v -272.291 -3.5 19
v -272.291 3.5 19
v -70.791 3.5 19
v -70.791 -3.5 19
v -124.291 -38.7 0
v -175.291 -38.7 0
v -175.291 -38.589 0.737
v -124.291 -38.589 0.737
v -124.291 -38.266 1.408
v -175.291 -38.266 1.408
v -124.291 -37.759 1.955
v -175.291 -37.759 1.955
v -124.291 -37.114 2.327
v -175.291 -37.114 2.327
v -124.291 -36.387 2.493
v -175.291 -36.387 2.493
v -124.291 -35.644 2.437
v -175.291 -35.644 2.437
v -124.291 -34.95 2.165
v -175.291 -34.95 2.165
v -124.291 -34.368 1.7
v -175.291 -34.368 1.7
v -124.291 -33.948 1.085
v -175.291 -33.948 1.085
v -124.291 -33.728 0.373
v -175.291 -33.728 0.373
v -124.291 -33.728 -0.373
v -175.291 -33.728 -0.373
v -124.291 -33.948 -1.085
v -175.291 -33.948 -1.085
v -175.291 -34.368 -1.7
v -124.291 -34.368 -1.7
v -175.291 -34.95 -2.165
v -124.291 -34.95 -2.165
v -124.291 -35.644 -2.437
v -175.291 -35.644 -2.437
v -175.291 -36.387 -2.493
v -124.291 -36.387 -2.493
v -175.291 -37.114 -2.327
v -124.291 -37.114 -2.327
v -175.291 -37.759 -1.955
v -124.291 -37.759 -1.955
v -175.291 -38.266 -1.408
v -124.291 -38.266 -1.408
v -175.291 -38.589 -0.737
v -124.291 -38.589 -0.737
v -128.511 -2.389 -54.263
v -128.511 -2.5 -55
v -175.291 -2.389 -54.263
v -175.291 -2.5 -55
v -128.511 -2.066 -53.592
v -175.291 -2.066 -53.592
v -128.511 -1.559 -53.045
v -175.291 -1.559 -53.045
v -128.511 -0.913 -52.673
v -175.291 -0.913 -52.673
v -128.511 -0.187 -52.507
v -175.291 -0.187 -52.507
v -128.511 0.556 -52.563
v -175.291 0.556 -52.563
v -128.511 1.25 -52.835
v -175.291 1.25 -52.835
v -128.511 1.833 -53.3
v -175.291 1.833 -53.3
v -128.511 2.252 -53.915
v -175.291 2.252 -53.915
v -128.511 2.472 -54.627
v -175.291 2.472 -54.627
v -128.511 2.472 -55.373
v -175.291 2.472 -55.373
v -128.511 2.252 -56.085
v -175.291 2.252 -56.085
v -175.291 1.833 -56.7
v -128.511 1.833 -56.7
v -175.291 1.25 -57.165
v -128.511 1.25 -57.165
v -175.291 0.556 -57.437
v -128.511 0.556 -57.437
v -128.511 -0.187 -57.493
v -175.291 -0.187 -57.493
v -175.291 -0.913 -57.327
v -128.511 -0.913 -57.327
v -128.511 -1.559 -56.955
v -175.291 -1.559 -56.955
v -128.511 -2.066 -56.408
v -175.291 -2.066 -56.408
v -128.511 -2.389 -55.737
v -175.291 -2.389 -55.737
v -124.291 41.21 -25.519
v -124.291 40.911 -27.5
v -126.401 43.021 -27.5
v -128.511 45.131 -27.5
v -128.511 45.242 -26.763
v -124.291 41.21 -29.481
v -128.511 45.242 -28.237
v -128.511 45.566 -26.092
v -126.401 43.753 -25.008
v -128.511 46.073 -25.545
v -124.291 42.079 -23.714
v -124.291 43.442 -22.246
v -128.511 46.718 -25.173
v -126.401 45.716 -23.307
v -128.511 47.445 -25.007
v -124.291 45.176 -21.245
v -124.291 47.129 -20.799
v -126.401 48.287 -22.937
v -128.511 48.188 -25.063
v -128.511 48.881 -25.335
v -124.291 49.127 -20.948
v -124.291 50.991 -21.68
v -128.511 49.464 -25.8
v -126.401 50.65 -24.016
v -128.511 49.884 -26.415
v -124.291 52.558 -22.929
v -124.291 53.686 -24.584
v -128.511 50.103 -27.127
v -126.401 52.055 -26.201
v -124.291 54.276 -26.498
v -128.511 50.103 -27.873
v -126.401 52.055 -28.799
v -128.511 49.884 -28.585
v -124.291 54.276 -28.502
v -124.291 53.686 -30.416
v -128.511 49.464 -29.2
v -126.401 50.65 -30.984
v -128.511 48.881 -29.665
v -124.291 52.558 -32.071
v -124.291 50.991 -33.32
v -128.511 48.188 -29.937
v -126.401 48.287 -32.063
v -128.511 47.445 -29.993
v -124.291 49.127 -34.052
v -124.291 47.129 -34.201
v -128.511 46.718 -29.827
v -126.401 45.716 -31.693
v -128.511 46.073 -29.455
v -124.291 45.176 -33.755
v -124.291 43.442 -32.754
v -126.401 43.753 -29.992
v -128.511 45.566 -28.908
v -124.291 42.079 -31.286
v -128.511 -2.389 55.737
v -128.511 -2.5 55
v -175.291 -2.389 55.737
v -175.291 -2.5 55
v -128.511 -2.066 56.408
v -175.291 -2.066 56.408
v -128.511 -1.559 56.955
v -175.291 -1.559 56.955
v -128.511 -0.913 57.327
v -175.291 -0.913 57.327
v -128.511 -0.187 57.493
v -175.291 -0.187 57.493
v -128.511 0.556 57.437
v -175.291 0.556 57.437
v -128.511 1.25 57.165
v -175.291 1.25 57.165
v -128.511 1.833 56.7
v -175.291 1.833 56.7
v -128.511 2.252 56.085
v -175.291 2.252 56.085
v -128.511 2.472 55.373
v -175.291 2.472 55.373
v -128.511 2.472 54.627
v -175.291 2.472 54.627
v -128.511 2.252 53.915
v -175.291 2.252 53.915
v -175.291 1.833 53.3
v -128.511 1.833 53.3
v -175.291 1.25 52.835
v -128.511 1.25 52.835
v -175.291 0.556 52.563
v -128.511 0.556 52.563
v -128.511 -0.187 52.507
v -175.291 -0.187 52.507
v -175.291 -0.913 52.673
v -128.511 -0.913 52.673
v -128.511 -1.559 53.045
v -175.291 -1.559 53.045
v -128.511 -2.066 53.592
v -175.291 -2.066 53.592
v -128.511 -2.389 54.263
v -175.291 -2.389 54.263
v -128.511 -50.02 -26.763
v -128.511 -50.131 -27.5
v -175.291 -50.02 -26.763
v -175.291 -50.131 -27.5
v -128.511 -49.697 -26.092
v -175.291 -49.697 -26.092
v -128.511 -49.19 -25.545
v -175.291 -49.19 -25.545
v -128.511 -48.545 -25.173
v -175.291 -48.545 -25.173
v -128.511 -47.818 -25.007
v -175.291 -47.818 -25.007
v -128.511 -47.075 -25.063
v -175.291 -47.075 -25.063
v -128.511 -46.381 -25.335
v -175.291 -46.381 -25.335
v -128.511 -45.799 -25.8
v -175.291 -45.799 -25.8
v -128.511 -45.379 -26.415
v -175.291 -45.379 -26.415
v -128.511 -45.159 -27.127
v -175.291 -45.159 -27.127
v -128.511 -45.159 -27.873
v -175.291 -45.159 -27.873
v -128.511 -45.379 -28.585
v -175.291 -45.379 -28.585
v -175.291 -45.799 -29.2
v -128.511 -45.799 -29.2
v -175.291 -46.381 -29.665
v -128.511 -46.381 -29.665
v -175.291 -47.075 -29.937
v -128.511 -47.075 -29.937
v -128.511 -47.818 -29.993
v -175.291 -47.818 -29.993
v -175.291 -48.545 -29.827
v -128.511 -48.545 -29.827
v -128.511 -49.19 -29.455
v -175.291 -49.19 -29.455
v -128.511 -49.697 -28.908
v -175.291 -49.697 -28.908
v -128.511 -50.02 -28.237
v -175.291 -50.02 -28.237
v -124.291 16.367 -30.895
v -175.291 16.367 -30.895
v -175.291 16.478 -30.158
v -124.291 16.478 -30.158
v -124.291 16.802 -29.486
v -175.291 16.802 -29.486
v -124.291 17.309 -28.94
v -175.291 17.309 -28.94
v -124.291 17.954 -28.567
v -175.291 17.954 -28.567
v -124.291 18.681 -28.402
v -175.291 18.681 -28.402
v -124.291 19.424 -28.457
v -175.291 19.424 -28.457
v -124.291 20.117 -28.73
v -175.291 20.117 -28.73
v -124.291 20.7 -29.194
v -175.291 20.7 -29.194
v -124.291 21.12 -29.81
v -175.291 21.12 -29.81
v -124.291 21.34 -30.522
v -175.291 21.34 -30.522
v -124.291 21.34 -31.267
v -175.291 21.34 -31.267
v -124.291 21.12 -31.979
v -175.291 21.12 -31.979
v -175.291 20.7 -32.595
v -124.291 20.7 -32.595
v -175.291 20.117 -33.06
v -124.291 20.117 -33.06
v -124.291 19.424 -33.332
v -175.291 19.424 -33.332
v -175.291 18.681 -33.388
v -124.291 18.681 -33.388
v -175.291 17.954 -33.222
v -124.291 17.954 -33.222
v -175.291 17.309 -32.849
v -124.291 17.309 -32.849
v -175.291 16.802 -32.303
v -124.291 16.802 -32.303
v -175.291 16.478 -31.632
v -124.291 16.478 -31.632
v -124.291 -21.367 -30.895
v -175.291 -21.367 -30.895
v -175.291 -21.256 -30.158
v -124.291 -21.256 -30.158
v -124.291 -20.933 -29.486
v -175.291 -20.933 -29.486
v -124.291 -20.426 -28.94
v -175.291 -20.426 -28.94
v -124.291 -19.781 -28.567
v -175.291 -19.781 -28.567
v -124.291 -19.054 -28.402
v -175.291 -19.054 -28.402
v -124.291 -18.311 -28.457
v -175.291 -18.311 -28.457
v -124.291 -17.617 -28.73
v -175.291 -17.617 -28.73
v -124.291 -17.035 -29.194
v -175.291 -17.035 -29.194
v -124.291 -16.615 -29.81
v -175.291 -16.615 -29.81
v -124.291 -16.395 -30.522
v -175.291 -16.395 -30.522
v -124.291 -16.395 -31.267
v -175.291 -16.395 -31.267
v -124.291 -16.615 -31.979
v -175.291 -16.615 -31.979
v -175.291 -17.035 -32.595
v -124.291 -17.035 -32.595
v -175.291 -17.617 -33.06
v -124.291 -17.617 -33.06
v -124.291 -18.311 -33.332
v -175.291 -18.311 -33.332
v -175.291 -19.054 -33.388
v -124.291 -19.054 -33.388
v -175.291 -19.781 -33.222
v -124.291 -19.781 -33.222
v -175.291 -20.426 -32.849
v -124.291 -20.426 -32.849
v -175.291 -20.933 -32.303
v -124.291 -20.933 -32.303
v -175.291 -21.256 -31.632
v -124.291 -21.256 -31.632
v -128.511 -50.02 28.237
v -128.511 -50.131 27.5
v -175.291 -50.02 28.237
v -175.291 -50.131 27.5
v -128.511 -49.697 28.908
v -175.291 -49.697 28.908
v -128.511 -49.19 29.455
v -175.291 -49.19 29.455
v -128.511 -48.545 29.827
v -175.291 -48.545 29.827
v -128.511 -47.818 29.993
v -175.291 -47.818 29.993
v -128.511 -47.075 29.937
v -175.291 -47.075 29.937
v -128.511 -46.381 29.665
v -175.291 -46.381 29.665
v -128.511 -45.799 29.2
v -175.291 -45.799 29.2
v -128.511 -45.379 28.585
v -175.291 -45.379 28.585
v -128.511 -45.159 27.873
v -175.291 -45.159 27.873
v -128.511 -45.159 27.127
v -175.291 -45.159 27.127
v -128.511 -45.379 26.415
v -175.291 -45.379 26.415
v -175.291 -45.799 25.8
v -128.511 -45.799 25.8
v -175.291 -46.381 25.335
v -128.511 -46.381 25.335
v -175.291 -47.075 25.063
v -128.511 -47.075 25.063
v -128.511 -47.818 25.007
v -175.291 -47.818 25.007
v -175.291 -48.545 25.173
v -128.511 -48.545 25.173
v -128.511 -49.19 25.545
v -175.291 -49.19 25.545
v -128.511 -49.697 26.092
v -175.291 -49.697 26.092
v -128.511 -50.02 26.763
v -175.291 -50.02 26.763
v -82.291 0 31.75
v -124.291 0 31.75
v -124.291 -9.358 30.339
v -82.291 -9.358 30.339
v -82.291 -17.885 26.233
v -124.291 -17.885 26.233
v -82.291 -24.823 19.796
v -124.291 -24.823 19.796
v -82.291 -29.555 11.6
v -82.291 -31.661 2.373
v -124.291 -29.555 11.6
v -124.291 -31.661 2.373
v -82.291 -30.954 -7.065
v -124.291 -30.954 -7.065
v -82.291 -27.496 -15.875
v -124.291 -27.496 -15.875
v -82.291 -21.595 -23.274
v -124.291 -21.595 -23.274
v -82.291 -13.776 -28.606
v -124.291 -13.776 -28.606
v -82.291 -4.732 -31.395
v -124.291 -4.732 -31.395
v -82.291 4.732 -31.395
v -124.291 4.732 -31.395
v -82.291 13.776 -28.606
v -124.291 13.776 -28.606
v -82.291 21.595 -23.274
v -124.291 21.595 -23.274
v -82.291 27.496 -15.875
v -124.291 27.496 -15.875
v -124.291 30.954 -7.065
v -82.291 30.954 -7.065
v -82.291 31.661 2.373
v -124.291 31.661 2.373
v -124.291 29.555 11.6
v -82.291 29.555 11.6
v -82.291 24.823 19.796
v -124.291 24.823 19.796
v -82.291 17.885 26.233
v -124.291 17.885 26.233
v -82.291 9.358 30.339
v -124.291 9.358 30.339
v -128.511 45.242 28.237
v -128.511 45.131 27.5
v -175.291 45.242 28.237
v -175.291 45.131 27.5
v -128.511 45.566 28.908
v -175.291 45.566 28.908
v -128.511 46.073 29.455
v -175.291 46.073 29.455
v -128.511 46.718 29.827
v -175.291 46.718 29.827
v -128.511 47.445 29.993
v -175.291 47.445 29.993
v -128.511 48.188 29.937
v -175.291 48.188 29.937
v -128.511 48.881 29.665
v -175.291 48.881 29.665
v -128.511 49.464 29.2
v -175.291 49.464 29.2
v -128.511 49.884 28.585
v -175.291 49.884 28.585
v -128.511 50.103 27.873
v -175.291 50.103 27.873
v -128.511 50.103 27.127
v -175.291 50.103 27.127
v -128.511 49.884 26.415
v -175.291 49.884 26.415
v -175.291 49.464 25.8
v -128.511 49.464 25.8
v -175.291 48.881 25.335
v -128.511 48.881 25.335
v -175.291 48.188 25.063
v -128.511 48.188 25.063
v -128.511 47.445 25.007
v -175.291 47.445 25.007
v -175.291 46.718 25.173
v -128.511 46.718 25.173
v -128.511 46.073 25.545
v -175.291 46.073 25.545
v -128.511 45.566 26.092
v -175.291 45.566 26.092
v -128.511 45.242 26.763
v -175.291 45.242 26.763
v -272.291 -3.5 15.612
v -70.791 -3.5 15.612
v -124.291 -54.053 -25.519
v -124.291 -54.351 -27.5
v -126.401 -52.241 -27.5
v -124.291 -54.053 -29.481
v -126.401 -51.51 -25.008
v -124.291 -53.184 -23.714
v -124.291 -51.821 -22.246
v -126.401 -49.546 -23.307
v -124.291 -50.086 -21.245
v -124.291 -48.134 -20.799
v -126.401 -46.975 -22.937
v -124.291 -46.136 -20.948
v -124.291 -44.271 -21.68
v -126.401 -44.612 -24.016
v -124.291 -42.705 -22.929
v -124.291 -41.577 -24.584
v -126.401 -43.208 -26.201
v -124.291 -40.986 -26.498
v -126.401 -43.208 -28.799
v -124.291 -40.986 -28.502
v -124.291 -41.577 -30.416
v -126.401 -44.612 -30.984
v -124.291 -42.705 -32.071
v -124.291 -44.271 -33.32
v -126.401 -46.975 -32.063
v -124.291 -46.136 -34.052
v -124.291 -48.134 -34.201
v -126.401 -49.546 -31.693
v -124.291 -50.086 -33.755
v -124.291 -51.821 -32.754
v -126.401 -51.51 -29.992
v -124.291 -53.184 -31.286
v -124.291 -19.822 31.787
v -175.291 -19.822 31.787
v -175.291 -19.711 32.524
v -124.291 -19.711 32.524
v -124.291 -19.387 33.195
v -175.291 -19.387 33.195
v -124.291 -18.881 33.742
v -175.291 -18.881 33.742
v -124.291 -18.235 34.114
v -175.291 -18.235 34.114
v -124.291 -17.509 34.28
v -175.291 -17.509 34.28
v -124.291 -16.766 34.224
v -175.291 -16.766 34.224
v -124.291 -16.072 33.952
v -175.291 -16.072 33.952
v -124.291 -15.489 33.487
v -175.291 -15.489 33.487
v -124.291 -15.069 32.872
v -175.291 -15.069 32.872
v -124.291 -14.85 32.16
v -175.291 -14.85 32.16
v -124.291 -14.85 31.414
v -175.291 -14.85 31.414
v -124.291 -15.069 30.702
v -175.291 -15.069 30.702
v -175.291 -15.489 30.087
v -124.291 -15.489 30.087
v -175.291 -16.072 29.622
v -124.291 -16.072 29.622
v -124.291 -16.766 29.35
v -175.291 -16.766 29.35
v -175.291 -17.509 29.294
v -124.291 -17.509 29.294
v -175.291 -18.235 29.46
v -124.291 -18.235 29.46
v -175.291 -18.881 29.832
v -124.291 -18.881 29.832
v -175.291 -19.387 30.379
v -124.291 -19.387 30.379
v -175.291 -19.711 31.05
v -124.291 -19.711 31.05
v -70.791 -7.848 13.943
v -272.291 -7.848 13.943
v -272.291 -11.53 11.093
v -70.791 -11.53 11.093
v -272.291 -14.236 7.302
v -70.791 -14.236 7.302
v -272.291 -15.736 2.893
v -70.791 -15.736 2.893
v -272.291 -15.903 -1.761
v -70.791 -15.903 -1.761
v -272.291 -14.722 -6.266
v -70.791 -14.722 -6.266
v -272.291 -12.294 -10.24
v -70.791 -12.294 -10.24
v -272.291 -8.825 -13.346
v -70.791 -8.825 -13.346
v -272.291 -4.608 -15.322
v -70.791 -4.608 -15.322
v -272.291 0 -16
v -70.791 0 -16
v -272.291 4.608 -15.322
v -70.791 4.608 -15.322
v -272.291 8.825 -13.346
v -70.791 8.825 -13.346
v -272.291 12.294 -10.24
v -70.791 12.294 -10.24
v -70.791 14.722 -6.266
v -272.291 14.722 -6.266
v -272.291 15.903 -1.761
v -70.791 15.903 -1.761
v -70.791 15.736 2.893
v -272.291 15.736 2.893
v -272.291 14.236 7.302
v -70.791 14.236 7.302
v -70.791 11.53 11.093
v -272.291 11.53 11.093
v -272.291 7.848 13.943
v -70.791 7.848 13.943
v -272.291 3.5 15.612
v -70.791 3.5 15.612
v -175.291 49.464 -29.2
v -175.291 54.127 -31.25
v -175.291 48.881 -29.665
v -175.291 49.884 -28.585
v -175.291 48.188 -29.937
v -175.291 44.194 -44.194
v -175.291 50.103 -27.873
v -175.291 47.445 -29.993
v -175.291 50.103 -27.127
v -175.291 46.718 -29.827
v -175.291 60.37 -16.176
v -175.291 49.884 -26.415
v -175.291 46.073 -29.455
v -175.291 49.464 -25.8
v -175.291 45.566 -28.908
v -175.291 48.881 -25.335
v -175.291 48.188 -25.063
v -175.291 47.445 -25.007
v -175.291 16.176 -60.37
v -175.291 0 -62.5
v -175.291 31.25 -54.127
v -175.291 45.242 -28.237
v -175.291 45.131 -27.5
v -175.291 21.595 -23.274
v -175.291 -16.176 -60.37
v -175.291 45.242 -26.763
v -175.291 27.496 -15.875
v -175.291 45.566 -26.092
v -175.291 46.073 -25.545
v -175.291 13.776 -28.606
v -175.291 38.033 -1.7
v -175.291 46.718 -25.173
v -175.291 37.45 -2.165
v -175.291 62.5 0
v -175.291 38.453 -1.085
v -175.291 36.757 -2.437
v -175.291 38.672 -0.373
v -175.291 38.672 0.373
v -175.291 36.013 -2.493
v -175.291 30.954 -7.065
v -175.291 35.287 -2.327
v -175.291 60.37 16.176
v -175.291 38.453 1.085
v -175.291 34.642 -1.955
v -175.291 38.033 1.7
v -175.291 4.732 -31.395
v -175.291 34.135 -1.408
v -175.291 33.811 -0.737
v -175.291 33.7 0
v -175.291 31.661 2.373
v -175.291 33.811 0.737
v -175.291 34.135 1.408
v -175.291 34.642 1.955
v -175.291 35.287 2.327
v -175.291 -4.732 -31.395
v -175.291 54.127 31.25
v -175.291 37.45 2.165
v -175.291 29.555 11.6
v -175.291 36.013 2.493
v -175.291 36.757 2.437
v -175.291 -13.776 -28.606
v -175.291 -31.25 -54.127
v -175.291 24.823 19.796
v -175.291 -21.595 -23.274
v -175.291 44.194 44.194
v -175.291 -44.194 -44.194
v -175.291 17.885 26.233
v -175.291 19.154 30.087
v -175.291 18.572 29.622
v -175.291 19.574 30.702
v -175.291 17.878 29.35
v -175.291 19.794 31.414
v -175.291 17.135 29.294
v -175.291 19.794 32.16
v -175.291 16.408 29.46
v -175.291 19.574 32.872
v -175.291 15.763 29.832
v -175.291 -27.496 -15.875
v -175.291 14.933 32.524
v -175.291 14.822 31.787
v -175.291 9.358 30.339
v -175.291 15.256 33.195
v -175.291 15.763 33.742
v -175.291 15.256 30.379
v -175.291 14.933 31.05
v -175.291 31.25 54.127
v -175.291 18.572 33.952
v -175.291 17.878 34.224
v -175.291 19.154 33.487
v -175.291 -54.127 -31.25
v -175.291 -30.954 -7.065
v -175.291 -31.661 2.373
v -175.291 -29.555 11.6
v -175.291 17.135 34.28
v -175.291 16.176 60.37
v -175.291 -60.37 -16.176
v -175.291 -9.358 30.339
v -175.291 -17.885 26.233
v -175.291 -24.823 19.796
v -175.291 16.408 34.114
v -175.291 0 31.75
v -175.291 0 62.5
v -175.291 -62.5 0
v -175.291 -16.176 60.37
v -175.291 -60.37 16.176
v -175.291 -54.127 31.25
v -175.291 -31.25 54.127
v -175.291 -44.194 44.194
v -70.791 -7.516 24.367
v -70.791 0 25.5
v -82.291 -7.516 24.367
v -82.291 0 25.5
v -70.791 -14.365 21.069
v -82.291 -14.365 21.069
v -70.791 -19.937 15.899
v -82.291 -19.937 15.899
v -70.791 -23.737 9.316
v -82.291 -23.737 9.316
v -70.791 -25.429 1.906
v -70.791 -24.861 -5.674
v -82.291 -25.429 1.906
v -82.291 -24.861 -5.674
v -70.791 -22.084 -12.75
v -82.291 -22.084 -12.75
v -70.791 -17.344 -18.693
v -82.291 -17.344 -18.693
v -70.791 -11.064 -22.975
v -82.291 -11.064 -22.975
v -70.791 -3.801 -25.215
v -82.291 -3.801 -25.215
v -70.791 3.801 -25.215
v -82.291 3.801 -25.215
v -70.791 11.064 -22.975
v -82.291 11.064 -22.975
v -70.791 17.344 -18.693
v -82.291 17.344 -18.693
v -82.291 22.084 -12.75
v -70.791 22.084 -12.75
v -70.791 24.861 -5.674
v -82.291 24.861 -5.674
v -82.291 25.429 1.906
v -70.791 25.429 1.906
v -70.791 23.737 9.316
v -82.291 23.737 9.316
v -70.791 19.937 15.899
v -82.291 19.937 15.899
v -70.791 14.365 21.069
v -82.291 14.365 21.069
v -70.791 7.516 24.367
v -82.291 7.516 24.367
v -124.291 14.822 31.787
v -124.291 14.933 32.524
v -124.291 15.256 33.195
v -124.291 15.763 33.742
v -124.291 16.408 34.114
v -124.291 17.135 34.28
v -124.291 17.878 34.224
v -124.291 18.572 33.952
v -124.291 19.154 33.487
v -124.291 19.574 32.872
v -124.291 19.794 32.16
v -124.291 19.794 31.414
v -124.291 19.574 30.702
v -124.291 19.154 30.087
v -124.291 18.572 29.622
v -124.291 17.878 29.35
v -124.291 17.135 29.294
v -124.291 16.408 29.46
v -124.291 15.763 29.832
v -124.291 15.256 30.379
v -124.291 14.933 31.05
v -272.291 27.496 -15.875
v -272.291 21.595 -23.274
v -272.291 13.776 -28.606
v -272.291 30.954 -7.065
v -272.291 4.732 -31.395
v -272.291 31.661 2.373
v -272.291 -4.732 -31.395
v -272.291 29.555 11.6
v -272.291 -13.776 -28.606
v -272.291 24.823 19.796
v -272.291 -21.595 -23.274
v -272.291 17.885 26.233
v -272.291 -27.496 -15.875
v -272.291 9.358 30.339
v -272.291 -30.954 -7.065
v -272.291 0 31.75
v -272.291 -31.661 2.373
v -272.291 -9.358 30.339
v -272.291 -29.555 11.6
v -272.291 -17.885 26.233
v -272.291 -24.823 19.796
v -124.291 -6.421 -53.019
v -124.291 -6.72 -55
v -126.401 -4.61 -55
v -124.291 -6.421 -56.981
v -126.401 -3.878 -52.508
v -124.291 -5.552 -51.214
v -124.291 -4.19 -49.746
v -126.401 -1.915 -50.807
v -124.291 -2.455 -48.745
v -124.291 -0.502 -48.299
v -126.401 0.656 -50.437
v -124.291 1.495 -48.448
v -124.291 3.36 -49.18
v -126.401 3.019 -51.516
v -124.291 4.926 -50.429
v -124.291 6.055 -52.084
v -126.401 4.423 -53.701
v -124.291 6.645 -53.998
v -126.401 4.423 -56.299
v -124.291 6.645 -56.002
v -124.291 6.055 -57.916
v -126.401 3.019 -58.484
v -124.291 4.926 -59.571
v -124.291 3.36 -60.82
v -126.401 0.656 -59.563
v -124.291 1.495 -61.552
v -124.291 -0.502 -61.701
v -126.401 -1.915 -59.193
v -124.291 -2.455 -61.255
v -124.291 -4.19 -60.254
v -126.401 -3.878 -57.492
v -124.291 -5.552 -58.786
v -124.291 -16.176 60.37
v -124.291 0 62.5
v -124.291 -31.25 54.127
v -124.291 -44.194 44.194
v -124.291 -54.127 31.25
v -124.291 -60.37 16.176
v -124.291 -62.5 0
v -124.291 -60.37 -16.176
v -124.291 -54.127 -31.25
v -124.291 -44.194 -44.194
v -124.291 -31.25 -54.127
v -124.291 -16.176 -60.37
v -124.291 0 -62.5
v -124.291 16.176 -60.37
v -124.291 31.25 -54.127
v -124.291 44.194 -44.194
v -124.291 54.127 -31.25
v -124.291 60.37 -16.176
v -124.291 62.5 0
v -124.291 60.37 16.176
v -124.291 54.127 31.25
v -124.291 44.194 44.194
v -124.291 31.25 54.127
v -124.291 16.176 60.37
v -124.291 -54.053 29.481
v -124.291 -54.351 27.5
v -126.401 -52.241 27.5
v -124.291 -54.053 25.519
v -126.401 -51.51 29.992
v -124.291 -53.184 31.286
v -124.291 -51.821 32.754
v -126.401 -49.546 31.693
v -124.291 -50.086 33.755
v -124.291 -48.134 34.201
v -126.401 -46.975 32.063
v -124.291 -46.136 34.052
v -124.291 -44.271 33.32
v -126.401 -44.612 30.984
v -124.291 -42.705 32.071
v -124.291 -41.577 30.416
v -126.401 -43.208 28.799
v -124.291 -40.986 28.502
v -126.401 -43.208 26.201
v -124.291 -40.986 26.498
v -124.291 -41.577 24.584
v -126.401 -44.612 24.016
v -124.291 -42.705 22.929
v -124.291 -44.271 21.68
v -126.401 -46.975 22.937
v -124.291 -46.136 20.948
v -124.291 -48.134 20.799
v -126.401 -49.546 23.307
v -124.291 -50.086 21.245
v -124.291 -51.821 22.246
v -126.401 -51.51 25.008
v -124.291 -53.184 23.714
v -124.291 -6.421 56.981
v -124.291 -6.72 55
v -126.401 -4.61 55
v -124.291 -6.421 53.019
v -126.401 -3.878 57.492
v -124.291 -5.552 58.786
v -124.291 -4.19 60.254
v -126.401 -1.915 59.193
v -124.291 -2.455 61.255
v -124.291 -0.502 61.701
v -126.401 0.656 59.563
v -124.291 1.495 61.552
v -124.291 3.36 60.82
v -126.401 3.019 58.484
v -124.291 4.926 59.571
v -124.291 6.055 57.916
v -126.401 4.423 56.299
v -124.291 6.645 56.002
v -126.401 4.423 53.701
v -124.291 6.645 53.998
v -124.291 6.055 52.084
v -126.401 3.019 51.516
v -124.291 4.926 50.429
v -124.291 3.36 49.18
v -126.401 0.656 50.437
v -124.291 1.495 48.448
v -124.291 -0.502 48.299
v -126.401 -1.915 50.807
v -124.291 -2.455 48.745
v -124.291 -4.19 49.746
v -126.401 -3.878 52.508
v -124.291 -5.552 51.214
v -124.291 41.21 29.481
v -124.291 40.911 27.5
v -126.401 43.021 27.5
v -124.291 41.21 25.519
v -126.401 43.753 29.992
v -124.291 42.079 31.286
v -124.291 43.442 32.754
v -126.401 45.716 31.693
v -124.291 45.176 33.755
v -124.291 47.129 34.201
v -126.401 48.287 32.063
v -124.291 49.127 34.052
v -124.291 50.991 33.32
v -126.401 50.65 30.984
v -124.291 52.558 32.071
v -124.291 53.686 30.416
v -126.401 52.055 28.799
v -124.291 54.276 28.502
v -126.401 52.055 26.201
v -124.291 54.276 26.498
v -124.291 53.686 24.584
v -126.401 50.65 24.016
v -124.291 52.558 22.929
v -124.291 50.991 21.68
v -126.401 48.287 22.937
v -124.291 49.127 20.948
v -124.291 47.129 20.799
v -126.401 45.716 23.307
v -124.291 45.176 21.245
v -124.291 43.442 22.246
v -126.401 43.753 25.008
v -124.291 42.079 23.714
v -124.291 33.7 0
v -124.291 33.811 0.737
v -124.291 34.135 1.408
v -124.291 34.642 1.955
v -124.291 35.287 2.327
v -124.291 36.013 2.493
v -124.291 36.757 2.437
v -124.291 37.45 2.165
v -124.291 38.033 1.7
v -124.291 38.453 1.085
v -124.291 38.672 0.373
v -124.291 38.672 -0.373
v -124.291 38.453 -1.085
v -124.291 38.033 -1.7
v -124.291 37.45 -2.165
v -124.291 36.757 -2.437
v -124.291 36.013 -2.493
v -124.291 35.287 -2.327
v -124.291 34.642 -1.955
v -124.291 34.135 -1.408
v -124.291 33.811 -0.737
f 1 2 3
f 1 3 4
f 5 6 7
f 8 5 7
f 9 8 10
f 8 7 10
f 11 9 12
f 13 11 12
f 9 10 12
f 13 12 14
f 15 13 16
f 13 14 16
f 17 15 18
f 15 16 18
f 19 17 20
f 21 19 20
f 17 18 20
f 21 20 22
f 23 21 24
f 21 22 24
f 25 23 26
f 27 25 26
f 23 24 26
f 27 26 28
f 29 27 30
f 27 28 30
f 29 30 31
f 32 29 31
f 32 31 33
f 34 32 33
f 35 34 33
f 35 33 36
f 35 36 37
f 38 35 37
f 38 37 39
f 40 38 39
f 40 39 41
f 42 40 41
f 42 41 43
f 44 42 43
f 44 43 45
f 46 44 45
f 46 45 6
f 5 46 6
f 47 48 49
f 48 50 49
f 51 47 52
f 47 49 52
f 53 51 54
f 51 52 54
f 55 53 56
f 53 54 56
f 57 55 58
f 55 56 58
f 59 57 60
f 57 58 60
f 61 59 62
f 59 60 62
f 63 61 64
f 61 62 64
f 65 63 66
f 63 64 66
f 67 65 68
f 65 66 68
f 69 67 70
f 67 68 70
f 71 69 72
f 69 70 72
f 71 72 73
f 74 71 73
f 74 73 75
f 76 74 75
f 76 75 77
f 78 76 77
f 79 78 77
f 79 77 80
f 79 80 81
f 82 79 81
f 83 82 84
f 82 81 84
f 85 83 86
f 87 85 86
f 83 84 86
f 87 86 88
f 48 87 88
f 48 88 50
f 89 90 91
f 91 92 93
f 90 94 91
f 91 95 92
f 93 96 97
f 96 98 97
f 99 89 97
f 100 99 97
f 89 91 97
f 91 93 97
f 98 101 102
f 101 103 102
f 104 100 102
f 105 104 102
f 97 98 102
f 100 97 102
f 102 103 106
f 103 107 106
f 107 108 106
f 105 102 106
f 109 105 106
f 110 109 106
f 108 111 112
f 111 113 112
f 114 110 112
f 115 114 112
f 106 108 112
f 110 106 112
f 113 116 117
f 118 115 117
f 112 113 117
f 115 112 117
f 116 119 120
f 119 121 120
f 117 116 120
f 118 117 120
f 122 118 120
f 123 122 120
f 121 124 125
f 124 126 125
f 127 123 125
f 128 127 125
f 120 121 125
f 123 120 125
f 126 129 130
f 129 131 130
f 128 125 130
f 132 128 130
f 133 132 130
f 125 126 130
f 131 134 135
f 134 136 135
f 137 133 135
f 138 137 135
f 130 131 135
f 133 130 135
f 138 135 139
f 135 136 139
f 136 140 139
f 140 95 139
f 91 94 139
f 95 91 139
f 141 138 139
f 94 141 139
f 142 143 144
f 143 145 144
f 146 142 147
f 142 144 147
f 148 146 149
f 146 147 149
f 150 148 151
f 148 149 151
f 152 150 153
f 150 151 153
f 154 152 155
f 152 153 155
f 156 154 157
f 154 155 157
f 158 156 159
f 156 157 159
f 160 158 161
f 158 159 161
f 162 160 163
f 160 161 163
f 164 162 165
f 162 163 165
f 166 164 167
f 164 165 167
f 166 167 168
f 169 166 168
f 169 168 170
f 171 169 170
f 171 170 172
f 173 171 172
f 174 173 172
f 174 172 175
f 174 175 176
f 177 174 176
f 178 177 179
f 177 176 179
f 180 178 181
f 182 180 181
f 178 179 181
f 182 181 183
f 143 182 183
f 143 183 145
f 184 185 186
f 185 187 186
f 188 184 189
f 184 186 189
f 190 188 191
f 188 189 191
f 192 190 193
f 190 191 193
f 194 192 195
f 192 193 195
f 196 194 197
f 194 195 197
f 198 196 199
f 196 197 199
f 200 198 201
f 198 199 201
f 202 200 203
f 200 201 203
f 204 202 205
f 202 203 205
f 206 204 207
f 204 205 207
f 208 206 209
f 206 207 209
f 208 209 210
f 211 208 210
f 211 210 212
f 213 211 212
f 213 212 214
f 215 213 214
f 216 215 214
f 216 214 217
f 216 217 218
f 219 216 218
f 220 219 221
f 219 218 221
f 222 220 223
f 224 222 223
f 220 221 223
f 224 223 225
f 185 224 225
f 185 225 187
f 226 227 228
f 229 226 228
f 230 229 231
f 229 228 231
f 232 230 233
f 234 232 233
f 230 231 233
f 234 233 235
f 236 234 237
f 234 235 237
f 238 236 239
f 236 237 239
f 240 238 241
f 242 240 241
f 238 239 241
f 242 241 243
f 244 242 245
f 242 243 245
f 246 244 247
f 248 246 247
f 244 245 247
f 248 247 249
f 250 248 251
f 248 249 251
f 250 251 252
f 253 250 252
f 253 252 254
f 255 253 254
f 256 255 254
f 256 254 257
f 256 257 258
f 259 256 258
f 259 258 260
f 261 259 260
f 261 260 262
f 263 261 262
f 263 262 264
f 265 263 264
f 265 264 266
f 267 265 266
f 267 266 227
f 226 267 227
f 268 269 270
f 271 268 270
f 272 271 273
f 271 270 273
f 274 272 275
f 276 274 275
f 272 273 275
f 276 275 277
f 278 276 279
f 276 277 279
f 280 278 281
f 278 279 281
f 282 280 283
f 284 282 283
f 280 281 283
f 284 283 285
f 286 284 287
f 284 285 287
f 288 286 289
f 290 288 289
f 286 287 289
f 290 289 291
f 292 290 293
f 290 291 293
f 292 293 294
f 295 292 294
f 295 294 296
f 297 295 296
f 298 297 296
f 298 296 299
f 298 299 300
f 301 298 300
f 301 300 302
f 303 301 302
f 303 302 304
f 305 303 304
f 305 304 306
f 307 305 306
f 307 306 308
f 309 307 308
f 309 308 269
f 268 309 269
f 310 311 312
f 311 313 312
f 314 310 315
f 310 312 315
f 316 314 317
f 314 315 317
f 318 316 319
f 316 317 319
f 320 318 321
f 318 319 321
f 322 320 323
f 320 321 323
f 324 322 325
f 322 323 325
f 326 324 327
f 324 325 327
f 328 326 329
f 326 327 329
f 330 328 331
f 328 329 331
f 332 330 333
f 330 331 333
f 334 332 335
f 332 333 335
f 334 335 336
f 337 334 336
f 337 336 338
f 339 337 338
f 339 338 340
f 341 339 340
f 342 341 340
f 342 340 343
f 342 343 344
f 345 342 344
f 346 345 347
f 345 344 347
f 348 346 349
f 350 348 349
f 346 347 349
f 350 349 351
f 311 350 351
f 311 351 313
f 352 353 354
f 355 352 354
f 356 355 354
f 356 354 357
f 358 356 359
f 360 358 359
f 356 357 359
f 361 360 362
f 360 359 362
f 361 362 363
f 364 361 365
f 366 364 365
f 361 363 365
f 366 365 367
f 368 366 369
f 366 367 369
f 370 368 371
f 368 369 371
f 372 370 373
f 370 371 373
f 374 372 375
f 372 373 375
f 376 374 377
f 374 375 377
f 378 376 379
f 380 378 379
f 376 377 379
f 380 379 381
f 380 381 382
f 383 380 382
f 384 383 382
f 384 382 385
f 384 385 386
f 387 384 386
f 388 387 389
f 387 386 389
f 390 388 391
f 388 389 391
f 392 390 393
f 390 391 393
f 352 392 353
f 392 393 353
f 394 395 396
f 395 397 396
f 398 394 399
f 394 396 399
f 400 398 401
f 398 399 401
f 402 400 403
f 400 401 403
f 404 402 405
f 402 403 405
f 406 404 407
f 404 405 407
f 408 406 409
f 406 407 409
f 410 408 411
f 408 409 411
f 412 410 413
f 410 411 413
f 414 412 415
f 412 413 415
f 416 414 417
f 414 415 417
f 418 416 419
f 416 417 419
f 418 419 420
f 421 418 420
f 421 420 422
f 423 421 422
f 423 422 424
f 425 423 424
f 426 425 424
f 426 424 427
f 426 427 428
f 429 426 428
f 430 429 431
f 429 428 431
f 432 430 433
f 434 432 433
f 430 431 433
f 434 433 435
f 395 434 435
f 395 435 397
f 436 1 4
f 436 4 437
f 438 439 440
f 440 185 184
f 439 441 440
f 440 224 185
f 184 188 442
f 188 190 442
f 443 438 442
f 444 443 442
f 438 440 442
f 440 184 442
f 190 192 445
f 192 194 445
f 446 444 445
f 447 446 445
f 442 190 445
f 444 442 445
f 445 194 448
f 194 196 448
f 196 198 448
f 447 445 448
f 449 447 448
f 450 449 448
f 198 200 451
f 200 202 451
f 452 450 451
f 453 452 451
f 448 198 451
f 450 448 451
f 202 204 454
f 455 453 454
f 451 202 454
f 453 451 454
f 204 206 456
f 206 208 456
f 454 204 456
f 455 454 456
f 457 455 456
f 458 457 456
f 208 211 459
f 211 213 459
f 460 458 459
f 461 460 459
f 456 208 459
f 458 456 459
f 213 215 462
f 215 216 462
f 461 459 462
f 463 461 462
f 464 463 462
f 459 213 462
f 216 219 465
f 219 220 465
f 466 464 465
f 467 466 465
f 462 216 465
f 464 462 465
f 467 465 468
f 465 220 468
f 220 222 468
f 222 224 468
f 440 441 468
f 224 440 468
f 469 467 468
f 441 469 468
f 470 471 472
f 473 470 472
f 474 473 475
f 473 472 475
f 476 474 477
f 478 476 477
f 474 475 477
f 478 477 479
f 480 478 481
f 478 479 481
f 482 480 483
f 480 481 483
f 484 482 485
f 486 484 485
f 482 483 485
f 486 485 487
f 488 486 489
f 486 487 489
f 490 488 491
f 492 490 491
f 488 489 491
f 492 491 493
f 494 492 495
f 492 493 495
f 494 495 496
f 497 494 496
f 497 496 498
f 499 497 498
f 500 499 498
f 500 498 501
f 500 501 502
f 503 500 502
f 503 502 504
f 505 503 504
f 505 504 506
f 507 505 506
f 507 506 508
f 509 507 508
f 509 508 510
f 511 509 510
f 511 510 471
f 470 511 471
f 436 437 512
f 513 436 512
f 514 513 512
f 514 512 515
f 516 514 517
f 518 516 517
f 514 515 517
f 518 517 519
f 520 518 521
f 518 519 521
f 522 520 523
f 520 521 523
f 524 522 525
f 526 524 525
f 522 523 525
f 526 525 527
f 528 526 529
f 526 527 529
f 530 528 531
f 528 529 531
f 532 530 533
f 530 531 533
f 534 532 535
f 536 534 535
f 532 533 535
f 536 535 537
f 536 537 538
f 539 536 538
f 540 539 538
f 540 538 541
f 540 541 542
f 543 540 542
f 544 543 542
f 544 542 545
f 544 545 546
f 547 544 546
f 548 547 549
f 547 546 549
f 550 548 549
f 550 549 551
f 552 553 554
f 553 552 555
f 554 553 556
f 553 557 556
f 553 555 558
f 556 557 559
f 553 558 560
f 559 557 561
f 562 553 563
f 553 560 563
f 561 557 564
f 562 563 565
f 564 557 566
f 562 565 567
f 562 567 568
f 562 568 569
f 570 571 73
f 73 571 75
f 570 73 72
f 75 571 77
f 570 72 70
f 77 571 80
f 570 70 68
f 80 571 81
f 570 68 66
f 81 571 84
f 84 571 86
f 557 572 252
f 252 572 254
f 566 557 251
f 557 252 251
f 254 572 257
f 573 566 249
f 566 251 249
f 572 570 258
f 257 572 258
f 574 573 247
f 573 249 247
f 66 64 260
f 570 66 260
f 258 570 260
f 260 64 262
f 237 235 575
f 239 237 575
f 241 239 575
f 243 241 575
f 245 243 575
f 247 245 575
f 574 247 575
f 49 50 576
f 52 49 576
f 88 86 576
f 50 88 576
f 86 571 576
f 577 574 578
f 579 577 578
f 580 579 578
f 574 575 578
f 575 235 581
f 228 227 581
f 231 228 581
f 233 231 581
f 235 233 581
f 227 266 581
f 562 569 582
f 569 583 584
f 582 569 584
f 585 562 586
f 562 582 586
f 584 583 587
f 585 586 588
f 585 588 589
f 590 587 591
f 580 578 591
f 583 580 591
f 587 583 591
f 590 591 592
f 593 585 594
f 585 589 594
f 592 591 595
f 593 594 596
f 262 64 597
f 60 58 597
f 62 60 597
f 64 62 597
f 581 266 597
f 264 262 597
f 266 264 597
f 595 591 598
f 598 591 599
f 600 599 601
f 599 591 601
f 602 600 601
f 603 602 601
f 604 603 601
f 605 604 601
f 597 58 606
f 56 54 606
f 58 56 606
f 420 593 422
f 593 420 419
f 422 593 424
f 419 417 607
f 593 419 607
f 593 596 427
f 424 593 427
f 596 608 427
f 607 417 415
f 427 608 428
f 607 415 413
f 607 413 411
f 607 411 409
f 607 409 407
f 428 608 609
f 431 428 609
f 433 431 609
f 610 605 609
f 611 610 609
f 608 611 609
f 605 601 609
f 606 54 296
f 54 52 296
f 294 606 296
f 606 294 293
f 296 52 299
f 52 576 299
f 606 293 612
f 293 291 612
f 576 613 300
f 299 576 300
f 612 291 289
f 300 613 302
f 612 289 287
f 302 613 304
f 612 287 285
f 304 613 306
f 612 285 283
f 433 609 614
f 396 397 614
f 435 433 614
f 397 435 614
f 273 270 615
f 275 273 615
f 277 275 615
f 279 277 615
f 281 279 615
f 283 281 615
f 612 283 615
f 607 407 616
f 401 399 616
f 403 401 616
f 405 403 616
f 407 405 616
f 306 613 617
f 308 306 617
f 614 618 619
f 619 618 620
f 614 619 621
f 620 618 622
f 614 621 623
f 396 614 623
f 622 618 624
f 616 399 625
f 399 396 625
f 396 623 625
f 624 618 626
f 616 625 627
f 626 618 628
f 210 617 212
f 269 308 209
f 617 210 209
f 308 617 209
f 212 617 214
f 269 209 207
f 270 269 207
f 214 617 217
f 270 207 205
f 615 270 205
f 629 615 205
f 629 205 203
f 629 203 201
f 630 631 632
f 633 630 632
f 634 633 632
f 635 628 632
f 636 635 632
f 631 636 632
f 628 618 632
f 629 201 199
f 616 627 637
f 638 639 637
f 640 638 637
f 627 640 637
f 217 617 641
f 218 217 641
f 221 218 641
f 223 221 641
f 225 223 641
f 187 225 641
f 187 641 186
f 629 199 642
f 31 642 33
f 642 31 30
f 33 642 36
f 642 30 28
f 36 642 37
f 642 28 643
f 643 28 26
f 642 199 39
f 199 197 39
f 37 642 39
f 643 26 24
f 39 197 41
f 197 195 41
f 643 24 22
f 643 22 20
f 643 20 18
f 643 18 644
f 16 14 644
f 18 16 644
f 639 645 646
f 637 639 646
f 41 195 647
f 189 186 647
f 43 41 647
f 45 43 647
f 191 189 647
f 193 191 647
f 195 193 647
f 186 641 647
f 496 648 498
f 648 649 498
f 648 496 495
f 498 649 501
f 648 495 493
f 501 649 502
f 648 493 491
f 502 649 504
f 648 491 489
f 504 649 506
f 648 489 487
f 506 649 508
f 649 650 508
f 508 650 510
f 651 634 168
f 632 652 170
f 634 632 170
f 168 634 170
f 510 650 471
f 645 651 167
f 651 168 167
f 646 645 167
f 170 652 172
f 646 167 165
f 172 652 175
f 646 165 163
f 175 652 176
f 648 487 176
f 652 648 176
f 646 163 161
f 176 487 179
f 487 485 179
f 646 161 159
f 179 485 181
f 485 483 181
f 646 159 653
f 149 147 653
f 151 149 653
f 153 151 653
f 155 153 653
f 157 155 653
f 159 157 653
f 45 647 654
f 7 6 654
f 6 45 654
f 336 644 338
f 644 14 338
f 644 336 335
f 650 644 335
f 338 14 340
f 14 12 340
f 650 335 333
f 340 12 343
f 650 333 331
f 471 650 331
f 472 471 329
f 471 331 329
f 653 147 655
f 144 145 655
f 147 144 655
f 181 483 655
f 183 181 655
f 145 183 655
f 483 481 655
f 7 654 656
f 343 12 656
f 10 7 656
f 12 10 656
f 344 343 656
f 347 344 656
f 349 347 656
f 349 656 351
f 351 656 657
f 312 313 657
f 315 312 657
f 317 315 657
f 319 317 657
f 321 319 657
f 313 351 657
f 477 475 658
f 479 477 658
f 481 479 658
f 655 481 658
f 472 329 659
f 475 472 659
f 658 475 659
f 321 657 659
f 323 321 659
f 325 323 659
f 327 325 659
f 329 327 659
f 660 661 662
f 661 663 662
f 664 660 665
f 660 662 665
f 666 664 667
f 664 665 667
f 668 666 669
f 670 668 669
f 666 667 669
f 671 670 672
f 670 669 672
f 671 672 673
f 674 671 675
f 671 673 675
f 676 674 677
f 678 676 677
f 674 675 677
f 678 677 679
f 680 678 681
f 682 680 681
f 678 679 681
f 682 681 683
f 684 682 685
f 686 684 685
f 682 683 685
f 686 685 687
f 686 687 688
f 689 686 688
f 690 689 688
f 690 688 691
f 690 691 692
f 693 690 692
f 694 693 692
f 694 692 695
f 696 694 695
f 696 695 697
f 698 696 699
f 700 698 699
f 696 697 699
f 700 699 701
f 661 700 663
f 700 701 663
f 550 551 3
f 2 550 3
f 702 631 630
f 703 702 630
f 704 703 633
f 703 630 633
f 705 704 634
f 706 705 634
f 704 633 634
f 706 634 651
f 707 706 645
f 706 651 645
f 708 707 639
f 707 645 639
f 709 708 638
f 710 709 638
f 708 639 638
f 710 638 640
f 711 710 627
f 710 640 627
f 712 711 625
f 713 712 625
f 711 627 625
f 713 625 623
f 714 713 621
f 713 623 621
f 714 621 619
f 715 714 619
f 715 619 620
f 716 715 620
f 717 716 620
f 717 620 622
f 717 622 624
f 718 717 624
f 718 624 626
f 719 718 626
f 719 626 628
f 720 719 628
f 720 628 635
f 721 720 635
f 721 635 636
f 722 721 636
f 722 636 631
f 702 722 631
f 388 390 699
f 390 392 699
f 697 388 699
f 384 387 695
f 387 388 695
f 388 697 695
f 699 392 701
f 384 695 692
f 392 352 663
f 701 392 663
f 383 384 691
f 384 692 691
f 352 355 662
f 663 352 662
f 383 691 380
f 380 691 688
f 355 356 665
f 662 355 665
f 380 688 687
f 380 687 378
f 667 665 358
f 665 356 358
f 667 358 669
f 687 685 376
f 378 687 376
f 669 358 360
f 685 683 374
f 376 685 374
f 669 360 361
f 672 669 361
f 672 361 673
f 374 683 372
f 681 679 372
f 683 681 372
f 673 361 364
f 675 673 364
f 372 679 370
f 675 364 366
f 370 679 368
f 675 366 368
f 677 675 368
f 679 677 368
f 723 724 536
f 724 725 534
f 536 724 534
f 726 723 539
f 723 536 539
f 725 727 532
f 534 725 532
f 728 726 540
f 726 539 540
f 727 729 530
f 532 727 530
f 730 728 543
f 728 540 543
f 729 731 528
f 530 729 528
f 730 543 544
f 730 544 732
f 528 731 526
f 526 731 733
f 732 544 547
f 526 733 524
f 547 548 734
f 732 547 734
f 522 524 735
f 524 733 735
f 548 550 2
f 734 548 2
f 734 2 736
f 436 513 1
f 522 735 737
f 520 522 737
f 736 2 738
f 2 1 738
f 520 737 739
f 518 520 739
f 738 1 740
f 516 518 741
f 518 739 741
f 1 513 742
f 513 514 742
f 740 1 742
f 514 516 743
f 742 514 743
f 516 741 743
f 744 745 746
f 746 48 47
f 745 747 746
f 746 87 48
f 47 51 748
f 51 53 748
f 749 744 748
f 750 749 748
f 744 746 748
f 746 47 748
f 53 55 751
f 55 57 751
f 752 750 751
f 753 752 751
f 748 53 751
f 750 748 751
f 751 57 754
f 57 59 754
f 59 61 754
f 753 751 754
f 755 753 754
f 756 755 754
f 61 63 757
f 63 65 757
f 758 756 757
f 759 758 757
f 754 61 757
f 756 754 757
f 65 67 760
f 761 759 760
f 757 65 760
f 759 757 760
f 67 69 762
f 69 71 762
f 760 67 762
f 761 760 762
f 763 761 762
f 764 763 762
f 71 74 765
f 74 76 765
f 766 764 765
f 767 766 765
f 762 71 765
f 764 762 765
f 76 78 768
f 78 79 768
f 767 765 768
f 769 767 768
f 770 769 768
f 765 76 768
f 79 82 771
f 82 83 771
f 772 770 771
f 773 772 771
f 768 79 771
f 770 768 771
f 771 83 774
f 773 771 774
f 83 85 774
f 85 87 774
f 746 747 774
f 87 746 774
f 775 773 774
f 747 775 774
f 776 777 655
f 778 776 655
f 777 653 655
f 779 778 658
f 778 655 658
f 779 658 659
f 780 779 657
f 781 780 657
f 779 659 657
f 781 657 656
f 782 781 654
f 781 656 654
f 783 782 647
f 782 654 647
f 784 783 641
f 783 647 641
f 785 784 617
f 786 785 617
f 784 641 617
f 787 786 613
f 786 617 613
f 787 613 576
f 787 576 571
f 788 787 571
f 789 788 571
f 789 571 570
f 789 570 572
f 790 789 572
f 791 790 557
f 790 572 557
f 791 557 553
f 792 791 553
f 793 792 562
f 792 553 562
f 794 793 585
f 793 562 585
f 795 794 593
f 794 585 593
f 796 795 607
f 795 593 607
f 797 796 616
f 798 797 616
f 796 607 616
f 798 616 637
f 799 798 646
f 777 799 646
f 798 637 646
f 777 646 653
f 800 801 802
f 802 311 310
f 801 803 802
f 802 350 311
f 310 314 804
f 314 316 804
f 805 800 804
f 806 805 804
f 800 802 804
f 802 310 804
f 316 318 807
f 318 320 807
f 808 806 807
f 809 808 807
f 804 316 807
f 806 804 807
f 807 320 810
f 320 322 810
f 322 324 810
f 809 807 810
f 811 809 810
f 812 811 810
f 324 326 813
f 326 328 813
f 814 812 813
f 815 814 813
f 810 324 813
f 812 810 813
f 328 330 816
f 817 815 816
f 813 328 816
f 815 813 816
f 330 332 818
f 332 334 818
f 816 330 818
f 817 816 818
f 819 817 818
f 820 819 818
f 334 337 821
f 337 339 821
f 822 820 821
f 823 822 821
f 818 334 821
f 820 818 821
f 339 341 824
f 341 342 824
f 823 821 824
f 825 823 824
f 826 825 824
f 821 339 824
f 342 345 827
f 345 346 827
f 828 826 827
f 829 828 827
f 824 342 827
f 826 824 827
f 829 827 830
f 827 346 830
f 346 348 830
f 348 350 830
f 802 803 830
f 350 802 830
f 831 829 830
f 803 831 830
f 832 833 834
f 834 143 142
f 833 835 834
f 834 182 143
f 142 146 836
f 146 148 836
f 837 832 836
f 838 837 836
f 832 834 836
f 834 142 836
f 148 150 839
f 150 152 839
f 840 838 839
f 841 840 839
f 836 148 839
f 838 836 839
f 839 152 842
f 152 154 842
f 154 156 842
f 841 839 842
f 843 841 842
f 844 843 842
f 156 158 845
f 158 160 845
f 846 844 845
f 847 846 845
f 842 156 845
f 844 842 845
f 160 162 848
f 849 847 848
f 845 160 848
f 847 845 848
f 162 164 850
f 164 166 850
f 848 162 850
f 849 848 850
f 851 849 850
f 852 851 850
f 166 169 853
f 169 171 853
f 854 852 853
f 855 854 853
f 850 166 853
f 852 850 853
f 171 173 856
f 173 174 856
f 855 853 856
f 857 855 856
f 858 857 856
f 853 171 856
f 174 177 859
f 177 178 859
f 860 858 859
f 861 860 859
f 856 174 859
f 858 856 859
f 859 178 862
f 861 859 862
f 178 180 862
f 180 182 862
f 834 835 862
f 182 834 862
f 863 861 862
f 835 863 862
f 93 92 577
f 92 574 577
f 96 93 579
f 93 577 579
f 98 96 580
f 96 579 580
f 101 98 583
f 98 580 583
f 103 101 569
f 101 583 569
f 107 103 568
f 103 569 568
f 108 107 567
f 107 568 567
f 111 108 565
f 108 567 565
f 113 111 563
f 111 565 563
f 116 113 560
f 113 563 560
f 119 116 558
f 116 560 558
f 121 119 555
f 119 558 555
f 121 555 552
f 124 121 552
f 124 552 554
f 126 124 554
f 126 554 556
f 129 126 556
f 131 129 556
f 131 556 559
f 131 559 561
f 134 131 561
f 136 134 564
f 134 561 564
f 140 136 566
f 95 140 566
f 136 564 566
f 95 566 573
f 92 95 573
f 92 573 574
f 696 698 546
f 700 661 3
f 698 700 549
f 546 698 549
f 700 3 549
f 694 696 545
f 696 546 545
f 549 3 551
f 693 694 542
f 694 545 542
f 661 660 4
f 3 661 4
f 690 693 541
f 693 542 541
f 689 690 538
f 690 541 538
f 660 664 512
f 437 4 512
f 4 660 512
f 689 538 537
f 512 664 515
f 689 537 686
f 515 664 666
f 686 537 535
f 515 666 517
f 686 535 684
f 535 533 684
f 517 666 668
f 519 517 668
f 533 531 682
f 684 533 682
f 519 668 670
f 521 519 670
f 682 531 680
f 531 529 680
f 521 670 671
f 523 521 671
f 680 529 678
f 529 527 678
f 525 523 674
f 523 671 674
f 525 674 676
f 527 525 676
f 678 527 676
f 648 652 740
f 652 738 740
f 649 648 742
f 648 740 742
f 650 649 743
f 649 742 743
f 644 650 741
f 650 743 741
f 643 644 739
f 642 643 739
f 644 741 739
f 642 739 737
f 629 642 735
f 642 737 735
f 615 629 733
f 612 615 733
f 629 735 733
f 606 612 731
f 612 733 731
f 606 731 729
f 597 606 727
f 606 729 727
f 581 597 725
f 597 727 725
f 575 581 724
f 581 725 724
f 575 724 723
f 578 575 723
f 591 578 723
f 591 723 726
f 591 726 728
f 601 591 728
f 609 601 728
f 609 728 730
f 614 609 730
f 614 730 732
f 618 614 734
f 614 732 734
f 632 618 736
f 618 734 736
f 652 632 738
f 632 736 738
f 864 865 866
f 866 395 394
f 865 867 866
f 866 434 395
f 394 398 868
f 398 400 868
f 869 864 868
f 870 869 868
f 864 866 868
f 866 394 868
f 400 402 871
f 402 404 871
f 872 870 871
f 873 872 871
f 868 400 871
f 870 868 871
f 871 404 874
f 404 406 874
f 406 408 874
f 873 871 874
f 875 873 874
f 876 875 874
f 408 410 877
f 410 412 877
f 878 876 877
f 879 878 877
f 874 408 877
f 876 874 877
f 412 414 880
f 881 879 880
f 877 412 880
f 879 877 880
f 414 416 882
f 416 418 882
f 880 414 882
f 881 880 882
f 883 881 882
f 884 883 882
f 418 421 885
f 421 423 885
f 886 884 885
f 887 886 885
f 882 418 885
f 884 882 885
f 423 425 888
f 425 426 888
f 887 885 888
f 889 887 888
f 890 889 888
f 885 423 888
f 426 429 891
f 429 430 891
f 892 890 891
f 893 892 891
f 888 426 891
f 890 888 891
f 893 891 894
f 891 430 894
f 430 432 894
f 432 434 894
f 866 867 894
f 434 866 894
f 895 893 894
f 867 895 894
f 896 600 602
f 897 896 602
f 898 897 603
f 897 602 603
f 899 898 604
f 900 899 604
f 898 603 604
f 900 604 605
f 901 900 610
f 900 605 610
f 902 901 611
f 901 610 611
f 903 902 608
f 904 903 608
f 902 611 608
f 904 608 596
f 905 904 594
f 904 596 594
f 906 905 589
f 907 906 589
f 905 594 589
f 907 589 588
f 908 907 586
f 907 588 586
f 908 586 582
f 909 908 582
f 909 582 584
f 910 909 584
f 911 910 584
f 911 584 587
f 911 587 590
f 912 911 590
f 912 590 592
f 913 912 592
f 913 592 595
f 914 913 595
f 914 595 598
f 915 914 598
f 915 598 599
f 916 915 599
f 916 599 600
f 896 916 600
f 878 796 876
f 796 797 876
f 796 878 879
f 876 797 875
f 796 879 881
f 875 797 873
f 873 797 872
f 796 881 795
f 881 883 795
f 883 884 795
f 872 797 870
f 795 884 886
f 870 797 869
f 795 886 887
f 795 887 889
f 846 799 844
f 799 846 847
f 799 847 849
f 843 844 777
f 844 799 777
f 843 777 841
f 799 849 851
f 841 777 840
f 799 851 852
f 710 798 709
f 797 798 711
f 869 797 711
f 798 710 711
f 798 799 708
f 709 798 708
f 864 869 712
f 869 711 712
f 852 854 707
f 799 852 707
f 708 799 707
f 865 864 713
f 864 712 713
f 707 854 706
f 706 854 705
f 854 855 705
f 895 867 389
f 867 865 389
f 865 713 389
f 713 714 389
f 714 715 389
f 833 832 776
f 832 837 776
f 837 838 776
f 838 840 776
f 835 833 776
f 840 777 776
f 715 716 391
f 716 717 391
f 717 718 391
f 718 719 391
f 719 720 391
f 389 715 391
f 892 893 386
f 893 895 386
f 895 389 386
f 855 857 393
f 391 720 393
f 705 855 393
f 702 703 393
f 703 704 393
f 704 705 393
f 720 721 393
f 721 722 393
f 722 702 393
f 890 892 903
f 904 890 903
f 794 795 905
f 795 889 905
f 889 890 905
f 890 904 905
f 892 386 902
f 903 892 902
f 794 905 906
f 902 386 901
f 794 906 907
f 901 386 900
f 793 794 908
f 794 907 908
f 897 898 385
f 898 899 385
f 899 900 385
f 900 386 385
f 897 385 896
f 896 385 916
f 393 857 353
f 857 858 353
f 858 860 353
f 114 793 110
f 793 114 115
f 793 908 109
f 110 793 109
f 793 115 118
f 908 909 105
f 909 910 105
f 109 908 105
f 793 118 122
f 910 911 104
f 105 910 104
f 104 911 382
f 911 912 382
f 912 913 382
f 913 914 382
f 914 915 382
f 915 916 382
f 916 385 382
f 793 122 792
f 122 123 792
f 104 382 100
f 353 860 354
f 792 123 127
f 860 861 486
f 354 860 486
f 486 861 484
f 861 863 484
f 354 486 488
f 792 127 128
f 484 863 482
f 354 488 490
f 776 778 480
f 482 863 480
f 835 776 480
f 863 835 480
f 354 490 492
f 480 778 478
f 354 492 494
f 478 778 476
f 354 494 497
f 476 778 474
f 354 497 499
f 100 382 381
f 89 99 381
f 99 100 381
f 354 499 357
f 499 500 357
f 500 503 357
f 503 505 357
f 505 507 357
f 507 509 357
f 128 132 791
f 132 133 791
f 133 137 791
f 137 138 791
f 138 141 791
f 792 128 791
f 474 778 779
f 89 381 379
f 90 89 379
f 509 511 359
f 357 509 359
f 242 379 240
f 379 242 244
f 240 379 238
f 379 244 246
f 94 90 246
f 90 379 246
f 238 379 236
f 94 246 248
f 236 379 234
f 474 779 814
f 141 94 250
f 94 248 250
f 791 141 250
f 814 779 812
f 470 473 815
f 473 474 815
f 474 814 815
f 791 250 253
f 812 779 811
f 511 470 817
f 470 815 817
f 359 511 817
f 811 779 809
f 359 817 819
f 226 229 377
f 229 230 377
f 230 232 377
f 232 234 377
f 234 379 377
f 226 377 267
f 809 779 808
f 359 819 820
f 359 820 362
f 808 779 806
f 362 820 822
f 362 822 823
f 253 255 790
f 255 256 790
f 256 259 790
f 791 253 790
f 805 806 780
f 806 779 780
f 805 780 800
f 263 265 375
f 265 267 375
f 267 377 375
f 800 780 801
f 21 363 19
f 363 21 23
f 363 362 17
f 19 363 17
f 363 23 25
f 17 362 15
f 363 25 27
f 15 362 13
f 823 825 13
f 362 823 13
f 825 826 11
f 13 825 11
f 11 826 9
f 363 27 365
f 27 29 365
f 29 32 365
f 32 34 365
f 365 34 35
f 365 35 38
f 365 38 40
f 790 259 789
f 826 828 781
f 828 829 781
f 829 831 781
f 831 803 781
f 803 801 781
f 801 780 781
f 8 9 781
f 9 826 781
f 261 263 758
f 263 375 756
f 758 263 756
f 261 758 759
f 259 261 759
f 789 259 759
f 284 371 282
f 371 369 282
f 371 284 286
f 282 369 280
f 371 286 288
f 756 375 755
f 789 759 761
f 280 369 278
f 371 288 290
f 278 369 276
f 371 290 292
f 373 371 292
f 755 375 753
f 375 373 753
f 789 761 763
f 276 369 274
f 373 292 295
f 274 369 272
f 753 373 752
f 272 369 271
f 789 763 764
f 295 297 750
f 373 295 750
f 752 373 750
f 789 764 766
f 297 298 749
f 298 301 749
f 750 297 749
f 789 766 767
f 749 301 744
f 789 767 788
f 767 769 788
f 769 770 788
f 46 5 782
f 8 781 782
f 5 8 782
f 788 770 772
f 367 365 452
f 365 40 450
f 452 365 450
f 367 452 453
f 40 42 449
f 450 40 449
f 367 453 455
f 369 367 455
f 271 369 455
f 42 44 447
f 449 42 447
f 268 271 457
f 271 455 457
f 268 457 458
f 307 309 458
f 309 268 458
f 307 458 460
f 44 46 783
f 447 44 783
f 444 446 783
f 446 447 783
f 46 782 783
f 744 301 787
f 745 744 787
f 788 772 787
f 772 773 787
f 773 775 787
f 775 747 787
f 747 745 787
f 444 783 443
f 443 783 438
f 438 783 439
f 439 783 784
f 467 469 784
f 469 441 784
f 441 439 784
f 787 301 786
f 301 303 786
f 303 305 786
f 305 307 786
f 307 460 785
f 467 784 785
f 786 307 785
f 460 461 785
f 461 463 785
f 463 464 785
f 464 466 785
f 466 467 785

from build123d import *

# Parameters (mm, degrees)
F2_DEPTH       = 25
F4_D           = 5
F4_CSINK_D     = 13.44
F4_CSINK_ANGLE = 90
F6_D           = 5
F8_DEPTH       = 201.5


with BuildPart() as f1:
    # F0 (on Front) → F1 (revolve)
    with BuildSketch(Plane.XZ):
        Polygon((-272.2911421515, 31.75), (-272.2911421515, 16), (-70.7911421515, 16), (-70.7911421515, 25.5), (-82.2911421515, 25.5), (-82.2911421515, 31.75), (-149.2911421515, 31.75), (-149.2911421515, 62.5), (-175.2911421515, 62.5), (-175.2911421515, 31.75), align=None)
    revolve(axis=Axis((18.6580618019, 0, 0), (1, 0, 0)))

    # F2 (add): a face of the model
    f2_faces = [f1.faces().sort_by_distance(p)[0] for p in [
        (-149.2911421515, 0, -33.517766953),
    ]]
    extrude(f2_faces, amount=F2_DEPTH)

    # F4 (through all)
    with Locations(Plane.YZ.offset(-124.2911421515)):
        with Locations((-47.6313972081, 27.5), (47.6313972081, 27.5), (0, 55), (0, -55), (47.6313972081, -27.5), (-47.6313972081, -27.5)):
            CounterSinkHole(F4_D / 2, F4_CSINK_D / 2, counter_sink_angle=F4_CSINK_ANGLE)

    # F6 (through all)
    with Locations(Plane.YZ.offset(-124.2911421515)):
        with Locations((-36.2002509452, 0), (-17.3218229571, 31.7869881861), (17.3218229571, 31.7869881861), (36.2002509452, 0), (18.8674278004, -30.8946328137), (-18.8674278004, -30.8946328137)):
            Hole(F6_D / 2)

    # F7 (on face) → F8 (cut, through all)
    with BuildSketch(Plane.YZ.offset(-70.7911421515)):
        with BuildLine():
            ThreePointArc((-3.5, 15.612494996), (0, 16), (3.5, 15.612494996))
            Line((3.5, 15.612494996), (3.5, 19))
            Line((3.5, 19), (-3.5, 19))
            Line((-3.5, 19), (-3.5, 15.612494996))
        make_face()
    extrude(amount=-F8_DEPTH, mode=Mode.SUBTRACT)


solid = f1.part
